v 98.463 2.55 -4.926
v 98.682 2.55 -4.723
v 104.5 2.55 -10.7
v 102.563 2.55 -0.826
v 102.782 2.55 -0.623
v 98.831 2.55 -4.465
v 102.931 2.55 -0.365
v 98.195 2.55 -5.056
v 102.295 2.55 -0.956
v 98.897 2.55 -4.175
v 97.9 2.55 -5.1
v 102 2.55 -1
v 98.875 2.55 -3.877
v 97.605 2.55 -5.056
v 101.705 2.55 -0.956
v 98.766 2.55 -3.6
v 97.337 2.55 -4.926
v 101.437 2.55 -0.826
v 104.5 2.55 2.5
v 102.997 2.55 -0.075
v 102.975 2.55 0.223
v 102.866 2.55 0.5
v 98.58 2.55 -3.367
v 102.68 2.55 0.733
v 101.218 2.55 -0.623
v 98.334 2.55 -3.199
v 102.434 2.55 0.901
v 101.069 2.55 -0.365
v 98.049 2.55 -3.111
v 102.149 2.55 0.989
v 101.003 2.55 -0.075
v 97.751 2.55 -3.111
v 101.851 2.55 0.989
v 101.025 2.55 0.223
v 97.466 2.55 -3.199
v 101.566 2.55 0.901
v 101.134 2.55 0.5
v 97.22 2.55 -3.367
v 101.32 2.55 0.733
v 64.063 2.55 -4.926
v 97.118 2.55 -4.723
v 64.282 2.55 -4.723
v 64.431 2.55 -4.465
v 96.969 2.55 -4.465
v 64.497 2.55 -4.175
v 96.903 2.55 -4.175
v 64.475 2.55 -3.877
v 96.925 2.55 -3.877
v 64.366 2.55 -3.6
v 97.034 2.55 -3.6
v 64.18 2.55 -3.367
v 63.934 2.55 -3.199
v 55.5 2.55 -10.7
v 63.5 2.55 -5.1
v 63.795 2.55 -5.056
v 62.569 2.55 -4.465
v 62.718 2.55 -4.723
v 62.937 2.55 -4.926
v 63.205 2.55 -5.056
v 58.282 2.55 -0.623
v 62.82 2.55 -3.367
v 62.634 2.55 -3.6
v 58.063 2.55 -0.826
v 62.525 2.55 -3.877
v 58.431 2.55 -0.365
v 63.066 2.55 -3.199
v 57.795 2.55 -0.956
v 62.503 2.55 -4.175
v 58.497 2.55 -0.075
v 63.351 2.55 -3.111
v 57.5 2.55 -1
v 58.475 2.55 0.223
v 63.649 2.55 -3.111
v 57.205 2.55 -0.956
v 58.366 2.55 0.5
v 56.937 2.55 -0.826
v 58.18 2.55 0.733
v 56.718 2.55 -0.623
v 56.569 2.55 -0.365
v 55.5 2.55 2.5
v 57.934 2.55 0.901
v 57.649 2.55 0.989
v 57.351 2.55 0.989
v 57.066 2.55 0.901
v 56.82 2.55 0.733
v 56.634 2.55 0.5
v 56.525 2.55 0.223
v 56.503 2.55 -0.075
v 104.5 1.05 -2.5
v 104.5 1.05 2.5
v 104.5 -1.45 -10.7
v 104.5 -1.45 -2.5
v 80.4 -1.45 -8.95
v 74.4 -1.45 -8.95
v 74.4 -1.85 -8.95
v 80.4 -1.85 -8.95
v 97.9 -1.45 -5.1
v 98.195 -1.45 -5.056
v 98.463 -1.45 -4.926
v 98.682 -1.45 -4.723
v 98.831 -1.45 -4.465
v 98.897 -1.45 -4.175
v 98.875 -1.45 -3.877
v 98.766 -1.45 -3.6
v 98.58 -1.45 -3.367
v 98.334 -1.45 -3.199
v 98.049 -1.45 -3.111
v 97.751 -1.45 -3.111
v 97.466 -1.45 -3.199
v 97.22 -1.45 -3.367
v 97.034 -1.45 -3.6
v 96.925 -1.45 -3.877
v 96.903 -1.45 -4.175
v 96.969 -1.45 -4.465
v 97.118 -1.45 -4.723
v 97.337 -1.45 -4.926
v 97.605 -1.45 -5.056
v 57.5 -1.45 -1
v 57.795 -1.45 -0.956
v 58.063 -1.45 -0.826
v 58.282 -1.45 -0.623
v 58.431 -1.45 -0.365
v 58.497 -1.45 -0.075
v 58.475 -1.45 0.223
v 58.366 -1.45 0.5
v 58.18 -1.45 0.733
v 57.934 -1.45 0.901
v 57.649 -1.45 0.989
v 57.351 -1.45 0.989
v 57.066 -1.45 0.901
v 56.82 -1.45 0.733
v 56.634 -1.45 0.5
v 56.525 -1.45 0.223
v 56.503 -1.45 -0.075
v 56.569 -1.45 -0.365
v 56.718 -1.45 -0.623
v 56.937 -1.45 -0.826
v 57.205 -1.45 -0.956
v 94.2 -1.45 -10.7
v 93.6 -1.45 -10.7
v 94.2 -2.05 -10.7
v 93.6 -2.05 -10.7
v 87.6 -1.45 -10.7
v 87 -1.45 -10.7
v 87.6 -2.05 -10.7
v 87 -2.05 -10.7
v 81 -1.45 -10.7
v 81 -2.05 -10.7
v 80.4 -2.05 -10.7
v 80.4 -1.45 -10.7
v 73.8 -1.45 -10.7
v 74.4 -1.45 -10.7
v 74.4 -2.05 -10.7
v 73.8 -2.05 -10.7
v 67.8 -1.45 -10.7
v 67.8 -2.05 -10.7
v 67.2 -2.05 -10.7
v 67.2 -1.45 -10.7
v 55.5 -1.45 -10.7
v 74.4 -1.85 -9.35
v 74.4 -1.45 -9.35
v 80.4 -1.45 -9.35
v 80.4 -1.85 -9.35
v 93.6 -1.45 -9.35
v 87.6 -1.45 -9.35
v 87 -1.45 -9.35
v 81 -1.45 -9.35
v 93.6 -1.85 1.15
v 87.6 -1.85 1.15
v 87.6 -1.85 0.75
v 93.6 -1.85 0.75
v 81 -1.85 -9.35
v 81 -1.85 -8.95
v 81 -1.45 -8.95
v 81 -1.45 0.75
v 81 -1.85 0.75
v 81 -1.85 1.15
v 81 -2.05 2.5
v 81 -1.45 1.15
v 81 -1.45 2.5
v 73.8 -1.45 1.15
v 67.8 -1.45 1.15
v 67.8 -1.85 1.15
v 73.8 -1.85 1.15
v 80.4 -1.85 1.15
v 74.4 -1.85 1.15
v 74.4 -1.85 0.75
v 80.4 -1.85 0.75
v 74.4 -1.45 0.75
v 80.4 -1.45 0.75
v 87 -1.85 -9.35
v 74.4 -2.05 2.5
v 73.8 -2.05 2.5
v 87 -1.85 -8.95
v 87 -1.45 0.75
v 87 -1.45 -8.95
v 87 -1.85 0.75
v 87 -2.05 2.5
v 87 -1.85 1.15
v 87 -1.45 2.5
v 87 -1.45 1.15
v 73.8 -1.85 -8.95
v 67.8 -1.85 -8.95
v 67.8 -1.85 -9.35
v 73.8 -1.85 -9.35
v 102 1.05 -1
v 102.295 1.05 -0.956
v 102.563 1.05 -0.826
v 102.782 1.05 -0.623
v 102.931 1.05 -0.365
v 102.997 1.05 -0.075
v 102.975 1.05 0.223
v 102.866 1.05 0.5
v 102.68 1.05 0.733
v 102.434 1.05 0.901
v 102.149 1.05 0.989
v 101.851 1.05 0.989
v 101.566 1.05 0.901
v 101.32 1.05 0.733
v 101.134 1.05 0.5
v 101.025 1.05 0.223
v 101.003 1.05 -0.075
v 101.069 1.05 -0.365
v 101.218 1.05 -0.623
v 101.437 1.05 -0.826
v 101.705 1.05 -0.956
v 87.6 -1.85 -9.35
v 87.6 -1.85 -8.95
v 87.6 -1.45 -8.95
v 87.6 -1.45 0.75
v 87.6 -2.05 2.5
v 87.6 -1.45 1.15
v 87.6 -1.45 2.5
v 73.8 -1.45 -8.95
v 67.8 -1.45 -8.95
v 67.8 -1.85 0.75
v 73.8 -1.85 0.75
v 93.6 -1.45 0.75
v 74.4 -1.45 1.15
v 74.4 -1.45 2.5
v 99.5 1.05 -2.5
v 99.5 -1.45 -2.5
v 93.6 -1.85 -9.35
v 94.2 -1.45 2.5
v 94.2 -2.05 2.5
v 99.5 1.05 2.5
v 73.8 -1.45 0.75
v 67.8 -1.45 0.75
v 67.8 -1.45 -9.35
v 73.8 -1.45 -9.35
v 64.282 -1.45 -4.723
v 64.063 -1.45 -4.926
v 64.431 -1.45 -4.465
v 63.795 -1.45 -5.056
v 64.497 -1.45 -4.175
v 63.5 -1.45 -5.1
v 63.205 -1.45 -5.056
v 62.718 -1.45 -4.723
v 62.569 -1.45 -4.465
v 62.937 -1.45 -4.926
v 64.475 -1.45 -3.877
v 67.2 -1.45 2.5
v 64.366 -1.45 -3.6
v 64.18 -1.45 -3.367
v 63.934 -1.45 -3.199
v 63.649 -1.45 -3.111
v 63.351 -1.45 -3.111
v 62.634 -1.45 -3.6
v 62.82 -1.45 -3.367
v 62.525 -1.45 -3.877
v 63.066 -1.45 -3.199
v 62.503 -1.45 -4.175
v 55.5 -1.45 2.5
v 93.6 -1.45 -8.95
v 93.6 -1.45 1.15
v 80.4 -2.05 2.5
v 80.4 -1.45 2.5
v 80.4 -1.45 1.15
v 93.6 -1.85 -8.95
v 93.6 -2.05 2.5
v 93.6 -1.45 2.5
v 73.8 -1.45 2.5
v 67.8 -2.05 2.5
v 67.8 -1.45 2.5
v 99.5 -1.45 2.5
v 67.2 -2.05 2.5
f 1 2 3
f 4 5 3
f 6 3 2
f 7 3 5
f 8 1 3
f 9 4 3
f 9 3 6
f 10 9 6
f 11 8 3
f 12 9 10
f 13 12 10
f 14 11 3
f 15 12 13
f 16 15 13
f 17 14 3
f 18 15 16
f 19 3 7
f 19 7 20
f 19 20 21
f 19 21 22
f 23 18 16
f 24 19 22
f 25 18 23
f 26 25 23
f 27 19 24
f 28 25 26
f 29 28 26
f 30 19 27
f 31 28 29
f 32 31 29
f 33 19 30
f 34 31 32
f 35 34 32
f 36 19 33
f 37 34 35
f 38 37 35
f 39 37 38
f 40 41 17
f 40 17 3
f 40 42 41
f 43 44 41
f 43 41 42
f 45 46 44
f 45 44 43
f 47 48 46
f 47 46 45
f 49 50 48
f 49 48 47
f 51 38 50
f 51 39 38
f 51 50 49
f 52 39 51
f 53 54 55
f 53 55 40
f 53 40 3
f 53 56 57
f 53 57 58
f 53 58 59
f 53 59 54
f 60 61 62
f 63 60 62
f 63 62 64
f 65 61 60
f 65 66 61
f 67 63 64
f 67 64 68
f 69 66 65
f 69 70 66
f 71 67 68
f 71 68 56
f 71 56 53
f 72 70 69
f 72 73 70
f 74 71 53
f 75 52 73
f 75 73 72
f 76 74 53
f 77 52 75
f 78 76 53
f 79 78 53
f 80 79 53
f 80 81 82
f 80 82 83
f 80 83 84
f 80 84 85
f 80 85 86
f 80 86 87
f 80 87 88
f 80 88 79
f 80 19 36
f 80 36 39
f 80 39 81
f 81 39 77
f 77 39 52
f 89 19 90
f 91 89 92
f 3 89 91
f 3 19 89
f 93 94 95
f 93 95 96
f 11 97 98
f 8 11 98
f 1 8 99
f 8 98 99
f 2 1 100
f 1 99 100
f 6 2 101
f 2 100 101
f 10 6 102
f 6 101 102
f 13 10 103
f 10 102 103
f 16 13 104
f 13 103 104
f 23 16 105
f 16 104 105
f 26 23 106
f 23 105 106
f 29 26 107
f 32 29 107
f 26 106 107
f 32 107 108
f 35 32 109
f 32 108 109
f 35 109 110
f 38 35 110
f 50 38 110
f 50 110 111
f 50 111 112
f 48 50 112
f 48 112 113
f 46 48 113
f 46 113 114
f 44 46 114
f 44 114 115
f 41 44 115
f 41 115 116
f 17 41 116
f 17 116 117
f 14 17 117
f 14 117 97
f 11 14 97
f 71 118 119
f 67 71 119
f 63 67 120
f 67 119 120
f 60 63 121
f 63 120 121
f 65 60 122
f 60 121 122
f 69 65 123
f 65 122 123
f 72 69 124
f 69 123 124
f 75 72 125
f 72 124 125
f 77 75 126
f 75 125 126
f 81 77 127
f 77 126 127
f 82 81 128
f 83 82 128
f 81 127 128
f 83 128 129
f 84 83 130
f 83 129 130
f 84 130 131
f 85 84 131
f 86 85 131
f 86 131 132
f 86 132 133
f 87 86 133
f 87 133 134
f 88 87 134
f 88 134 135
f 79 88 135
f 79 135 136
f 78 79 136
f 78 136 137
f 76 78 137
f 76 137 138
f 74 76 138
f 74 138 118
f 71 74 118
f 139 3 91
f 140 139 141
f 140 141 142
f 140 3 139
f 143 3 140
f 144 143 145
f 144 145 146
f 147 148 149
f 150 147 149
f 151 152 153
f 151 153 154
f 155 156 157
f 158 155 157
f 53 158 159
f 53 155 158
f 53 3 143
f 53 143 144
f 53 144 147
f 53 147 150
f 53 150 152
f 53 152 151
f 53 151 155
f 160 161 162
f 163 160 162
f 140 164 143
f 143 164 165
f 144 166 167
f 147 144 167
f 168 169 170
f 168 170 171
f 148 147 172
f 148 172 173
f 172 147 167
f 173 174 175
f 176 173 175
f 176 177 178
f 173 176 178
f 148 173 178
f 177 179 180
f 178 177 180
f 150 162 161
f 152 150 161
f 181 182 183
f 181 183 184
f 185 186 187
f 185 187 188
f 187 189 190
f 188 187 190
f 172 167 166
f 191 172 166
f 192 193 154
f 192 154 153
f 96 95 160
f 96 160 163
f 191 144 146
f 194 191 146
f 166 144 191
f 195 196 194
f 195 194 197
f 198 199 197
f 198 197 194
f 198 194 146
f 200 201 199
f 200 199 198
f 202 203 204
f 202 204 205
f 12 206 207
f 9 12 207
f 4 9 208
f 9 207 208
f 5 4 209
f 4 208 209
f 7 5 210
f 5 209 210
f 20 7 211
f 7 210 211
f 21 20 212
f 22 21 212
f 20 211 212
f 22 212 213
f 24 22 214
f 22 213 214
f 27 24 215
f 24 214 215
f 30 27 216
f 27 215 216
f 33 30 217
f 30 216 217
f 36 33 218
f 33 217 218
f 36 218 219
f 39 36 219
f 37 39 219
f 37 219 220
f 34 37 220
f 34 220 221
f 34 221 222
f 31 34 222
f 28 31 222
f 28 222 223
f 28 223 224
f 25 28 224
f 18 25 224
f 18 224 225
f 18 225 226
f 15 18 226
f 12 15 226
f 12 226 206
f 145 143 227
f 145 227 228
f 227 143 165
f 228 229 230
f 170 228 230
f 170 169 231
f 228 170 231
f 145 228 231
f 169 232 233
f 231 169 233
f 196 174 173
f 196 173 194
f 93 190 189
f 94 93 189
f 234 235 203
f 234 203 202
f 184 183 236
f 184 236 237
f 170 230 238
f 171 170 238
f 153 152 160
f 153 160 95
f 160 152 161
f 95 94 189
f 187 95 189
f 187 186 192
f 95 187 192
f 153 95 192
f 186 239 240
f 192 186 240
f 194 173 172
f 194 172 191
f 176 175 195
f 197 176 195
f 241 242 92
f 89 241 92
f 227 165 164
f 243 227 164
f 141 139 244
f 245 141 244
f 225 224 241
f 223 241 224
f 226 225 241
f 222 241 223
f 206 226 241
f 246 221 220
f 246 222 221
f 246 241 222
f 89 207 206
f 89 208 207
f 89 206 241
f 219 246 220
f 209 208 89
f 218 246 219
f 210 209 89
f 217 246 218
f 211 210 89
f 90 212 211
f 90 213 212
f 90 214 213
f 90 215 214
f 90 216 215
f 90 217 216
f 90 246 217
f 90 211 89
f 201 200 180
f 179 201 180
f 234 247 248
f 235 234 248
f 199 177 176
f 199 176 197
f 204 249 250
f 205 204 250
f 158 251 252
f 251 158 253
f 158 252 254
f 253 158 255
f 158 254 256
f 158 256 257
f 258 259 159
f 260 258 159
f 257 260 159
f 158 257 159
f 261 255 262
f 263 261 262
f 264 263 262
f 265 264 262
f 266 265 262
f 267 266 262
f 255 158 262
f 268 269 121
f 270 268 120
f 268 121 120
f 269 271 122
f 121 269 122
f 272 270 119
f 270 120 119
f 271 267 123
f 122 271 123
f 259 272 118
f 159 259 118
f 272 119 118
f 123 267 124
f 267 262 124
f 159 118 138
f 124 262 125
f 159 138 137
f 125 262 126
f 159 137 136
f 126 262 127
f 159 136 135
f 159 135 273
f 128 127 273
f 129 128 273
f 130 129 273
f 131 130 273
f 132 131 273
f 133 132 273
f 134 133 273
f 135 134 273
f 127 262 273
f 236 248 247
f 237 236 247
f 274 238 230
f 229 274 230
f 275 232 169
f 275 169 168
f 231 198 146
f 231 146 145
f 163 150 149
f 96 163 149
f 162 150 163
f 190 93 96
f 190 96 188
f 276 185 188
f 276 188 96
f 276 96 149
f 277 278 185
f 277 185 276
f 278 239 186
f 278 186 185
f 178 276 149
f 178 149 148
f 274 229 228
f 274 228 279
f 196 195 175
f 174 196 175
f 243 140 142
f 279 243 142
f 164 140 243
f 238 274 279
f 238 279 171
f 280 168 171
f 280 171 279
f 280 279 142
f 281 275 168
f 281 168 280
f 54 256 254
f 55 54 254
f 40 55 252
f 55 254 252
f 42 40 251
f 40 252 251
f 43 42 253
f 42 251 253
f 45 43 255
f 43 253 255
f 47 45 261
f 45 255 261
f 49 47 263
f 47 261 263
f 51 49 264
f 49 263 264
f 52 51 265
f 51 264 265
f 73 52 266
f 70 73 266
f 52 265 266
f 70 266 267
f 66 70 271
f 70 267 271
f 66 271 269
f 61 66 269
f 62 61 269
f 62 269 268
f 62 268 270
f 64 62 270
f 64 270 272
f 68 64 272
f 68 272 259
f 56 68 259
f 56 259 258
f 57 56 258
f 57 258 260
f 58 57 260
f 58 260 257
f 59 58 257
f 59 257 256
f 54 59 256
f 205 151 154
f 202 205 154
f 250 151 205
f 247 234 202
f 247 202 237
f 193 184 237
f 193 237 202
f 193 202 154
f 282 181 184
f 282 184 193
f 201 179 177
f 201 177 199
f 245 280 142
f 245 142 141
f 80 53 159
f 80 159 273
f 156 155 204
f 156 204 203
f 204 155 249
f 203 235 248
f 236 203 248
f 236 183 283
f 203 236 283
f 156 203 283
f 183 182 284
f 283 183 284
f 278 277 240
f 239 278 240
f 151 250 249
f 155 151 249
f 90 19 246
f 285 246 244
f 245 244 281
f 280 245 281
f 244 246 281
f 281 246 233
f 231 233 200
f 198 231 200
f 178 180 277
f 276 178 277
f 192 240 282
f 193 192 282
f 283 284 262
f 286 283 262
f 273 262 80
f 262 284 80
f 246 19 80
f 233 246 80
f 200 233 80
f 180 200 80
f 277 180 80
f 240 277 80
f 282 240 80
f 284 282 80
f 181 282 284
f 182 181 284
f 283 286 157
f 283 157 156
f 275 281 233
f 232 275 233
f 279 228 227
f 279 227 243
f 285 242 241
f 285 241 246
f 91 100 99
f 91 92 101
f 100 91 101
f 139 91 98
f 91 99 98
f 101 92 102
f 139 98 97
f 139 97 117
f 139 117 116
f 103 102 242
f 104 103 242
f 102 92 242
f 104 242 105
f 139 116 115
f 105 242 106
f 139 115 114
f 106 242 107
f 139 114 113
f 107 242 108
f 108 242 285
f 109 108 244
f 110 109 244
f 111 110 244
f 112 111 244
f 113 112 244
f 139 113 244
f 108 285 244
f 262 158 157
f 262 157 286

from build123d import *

# Parameters (mm, degrees)
SKETCH_1_R           = 1.25
EXTRUDE_1_DEPTH      = 2.5
SKETCH_2_W           = 82
SKETCH_2_H           = 7
CUT_EXTRUDE_1_DEPTH  = 2.5
SKETCH_3_W           = 79
SKETCH_3_H           = 4
EXTRUDE_2_DEPTH      = 10.7
SKETCH_4_W           = 0.6
SKETCH_4_H           = 13.2
EXTRUDE_3_DEPTH      = 0.6
SKETCH_5_W           = 6
SKETCH_5_H           = 0.4
EXTRUDE_4_DEPTH      = 0.4
SKETCH_11_R          = 1
CUT_EXTRUDE_5_DEPTH  = 5
SKETCH_12_W          = 8
SKETCH_12_H          = 6.68793424
EXTRUDE_6_DEPTH      = 5.9
SKETCH_13_R          = 1
CUT_EXTRUDE_6_DEPTH  = 8
SKETCH_15_W          = 8
SKETCH_15_H          = 5.9
CUT_EXTRUDE_11_DEPTH = 5
CUT_EXTRUDE_12_DEPTH = 5
SKETCH_17_W          = 4.18793424
SKETCH_17_H          = 5.9
CUT_EXTRUDE_13_DEPTH = 15
SKETCH_18_W          = 13.2
SKETCH_18_H          = 4
CUT_EXTRUDE_14_DEPTH = 2.5
SKETCH_19_W          = 13.2
SKETCH_19_H          = 4
CUT_EXTRUDE_15_DEPTH = 2.5
SKETCH_21_R          = 1
CUT_EXTRUDE_16_DEPTH = 10
SKETCH_22_W          = 5
SKETCH_22_H          = 5
CUT_EXTRUDE_17_DEPTH = 2.5
SKETCH_23_W          = 13.2
SKETCH_23_H          = 4
CUT_EXTRUDE_18_DEPTH = 25
SKETCH_24_R          = 1
CUT_EXTRUDE_19_DEPTH = 25


with BuildPart() as part:
    # 스케치1 → 보스-돌출1 (new body)
    with BuildSketch(Plane.XY):
        with BuildLine():
            Line((0, 8.45), (110, 8.45))
            Line((110, 8.45), (110, -8.45))
            Line((110, -8.45), (0, -8.45))
            ThreePointArc((0, -8.45), (-8.45, 0), (0, 8.45))
        make_face()
        with Locations((-5.95, 0)):
            Circle(SKETCH_1_R, mode=Mode.SUBTRACT)
        with Locations((0, 5.95)):
            Circle(SKETCH_1_R, mode=Mode.SUBTRACT)
        with Locations((5.95, 0)):
            Circle(SKETCH_1_R, mode=Mode.SUBTRACT)
        with Locations((0, -5.95)):
            Circle(SKETCH_1_R, mode=Mode.SUBTRACT)
    extrude(amount=EXTRUDE_1_DEPTH)

    # 스케치2 → 컷-돌출1 (cut)
    with BuildSketch(Plane(origin=(0, 0, 0), x_dir=(-1, 0, 0), z_dir=(0, 0, -1))):
        with Locations((-69, -4.95)):
            Rectangle(SKETCH_2_W, SKETCH_2_H)
    extrude(amount=-CUT_EXTRUDE_1_DEPTH, mode=Mode.SUBTRACT)

    # 스케치3 → 보스-돌출2 (add)
    with BuildSketch(Plane(origin=(0, 0, 0), x_dir=(-1, 0, 0), z_dir=(0, 0, -1))):
        with Locations((-67.5, 0.55)):
            Rectangle(SKETCH_3_W, SKETCH_3_H)
    extrude(amount=EXTRUDE_2_DEPTH)

    # 스케치4 → 보스-돌출3 (add)
    with BuildSketch(Plane.XZ.offset(1.45)):
        with Locations((74.1, -4.1)):
            Rectangle(SKETCH_4_W, SKETCH_4_H)
        with Locations((67.5, -4.1)):
            Rectangle(SKETCH_4_W, SKETCH_4_H)
        with Locations((80.7, -4.1)):
            Rectangle(SKETCH_4_W, SKETCH_4_H)
        with Locations((87.3, -4.1)):
            Rectangle(SKETCH_4_W, SKETCH_4_H)
        with Locations((93.9, -4.1)):
            Rectangle(SKETCH_4_W, SKETCH_4_H)
    extrude(amount=EXTRUDE_3_DEPTH)

    # 스케치5 → 보스-돌출4 (add)
    with BuildSketch(Plane.XZ.offset(1.45)):
        with Locations((70.8, 0.95)):
            Rectangle(SKETCH_5_W, SKETCH_5_H)
        with Locations((70.8, -9.15)):
            Rectangle(SKETCH_5_W, SKETCH_5_H)
        with Locations((77.4, 0.95)):
            Rectangle(SKETCH_5_W, SKETCH_5_H)
        with Locations((77.4, -9.15)):
            Rectangle(SKETCH_5_W, SKETCH_5_H)
        with Locations((84, 0.95)):
            Rectangle(SKETCH_5_W, SKETCH_5_H)
        with Locations((84, -9.15)):
            Rectangle(SKETCH_5_W, SKETCH_5_H)
        with Locations((90.6, 0.95)):
            Rectangle(SKETCH_5_W, SKETCH_5_H)
        with Locations((90.6, -9.15)):
            Rectangle(SKETCH_5_W, SKETCH_5_H)
    extrude(amount=EXTRUDE_4_DEPTH)

    # 스케치11 → 컷-돌출5 (cut)
    with BuildSketch(Plane.XZ.offset(1.45)):
        with Locations(Location((102, 0, 0), (0, 0, 270))):
            Circle(SKETCH_11_R)
        with Locations(Location((33, 0, 0), (0, 0, 270))):
            Circle(SKETCH_11_R)
    extrude(amount=-CUT_EXTRUDE_5_DEPTH, mode=Mode.SUBTRACT)

    # 스케치12 → 보스-돌출6 (add)
    with BuildSketch(Plane(origin=(0, 2.55, 0), x_dir=(1, 0, 0), z_dir=(0, 1, 0))):
        with Locations((67.5, 3.34396712)):
            Rectangle(SKETCH_12_W, SKETCH_12_H)
    extrude(amount=EXTRUDE_6_DEPTH)

    # 스케치13 → 컷-돌출6 (cut)
    with BuildSketch(Plane(origin=(0, 0, -6.68793424), x_dir=(-1, 0, 0), z_dir=(0, 0, -1))):
        with Locations((-67.5, 4.55)):
            Circle(SKETCH_13_R)
    extrude(amount=-CUT_EXTRUDE_6_DEPTH, mode=Mode.SUBTRACT)

    # 스케치15 → 컷-돌출11 (cut)
    with BuildSketch(Plane.XY.offset(2.5)):
        with Locations((67.5, 5.5)):
            Rectangle(SKETCH_15_W, SKETCH_15_H)
    extrude(amount=-CUT_EXTRUDE_11_DEPTH, mode=Mode.SUBTRACT)

    # 스케치16 → 컷-돌출12 (cut)
    with BuildSketch(Plane(origin=(0, 0, 0), x_dir=(-1, 0, 0), z_dir=(0, 0, -1))):
        with BuildLine():
            Line((-28, -8.45), (0, -8.45))
            ThreePointArc((0, -8.45), (8.45, 0), (0, 8.45))
            Line((0, 8.45), (-63.5, 8.45))
            Line((-63.5, 8.45), (-63.5, 2.55))
            Line((-63.5, 2.55), (-28, 2.55))
            Line((-28, 2.55), (-28, -8.45))
        make_face()
        Polygon((-71.5, 2.55), (-71.5, 8.45), (-110, 8.45), (-110, -1.45), (-107, -1.45), (-107, 2.55), align=None)
    extrude(amount=-CUT_EXTRUDE_12_DEPTH, mode=Mode.SUBTRACT)

    # 스케치17 → 컷-돌출13 (cut)
    with BuildSketch(Plane.ZY.offset(-63.5)):
        with Locations((-4.59396712, 5.5)):
            Rectangle(SKETCH_17_W, SKETCH_17_H)
    extrude(amount=-CUT_EXTRUDE_13_DEPTH, mode=Mode.SUBTRACT)

    # 스케치18 → 컷-돌출14 (cut)
    with BuildSketch(Plane.ZY.offset(-28)):
        with Locations((-4.1, 0.55)):
            Rectangle(SKETCH_18_W, SKETCH_18_H)
    extrude(amount=-CUT_EXTRUDE_14_DEPTH, mode=Mode.SUBTRACT)

    # 스케치19 → 컷-돌출15 (cut)
    with BuildSketch(Plane(origin=(107, 0, 0), x_dir=(0, 0, -1), z_dir=(1, 0, 0))):
        with Locations((4.1, 0.55)):
            Rectangle(SKETCH_19_W, SKETCH_19_H)
    extrude(amount=-CUT_EXTRUDE_15_DEPTH, mode=Mode.SUBTRACT)

    # 스케치21 → 컷-돌출16 (cut)
    with BuildSketch(Plane.XZ.offset(2.05)):
        with Locations(Location((63.5, -4.1, 0), (0, 0, 270))):
            Circle(SKETCH_21_R)
        with Locations(Location((97.9, -4.1, 0), (0, 0, 270))):
            Circle(SKETCH_21_R)
    extrude(amount=-CUT_EXTRUDE_16_DEPTH, mode=Mode.SUBTRACT)

    # 스케치22 → 컷-돌출17 (cut)
    with BuildSketch(Plane.XZ.offset(1.45)):
        with Locations((102, 0)):
            Rectangle(SKETCH_22_W, SKETCH_22_H)
    extrude(amount=-CUT_EXTRUDE_17_DEPTH, mode=Mode.SUBTRACT)

    # 스케치23 → 컷-돌출18 (cut)
    with BuildSketch(Plane.ZY.offset(-30.5)):
        with Locations((-4.1, 0.55)):
            Rectangle(SKETCH_23_W, SKETCH_23_H)
    extrude(amount=-CUT_EXTRUDE_18_DEPTH, mode=Mode.SUBTRACT)

    # 스케치24 → 컷-돌출19 (cut)
    with BuildSketch(Plane.XZ.offset(1.45)):
        with Locations(Location((57.5, 0, 0), (0, 0, 270))):
            Circle(SKETCH_24_R)
    extrude(amount=-CUT_EXTRUDE_19_DEPTH, mode=Mode.SUBTRACT)


solid = part.part
